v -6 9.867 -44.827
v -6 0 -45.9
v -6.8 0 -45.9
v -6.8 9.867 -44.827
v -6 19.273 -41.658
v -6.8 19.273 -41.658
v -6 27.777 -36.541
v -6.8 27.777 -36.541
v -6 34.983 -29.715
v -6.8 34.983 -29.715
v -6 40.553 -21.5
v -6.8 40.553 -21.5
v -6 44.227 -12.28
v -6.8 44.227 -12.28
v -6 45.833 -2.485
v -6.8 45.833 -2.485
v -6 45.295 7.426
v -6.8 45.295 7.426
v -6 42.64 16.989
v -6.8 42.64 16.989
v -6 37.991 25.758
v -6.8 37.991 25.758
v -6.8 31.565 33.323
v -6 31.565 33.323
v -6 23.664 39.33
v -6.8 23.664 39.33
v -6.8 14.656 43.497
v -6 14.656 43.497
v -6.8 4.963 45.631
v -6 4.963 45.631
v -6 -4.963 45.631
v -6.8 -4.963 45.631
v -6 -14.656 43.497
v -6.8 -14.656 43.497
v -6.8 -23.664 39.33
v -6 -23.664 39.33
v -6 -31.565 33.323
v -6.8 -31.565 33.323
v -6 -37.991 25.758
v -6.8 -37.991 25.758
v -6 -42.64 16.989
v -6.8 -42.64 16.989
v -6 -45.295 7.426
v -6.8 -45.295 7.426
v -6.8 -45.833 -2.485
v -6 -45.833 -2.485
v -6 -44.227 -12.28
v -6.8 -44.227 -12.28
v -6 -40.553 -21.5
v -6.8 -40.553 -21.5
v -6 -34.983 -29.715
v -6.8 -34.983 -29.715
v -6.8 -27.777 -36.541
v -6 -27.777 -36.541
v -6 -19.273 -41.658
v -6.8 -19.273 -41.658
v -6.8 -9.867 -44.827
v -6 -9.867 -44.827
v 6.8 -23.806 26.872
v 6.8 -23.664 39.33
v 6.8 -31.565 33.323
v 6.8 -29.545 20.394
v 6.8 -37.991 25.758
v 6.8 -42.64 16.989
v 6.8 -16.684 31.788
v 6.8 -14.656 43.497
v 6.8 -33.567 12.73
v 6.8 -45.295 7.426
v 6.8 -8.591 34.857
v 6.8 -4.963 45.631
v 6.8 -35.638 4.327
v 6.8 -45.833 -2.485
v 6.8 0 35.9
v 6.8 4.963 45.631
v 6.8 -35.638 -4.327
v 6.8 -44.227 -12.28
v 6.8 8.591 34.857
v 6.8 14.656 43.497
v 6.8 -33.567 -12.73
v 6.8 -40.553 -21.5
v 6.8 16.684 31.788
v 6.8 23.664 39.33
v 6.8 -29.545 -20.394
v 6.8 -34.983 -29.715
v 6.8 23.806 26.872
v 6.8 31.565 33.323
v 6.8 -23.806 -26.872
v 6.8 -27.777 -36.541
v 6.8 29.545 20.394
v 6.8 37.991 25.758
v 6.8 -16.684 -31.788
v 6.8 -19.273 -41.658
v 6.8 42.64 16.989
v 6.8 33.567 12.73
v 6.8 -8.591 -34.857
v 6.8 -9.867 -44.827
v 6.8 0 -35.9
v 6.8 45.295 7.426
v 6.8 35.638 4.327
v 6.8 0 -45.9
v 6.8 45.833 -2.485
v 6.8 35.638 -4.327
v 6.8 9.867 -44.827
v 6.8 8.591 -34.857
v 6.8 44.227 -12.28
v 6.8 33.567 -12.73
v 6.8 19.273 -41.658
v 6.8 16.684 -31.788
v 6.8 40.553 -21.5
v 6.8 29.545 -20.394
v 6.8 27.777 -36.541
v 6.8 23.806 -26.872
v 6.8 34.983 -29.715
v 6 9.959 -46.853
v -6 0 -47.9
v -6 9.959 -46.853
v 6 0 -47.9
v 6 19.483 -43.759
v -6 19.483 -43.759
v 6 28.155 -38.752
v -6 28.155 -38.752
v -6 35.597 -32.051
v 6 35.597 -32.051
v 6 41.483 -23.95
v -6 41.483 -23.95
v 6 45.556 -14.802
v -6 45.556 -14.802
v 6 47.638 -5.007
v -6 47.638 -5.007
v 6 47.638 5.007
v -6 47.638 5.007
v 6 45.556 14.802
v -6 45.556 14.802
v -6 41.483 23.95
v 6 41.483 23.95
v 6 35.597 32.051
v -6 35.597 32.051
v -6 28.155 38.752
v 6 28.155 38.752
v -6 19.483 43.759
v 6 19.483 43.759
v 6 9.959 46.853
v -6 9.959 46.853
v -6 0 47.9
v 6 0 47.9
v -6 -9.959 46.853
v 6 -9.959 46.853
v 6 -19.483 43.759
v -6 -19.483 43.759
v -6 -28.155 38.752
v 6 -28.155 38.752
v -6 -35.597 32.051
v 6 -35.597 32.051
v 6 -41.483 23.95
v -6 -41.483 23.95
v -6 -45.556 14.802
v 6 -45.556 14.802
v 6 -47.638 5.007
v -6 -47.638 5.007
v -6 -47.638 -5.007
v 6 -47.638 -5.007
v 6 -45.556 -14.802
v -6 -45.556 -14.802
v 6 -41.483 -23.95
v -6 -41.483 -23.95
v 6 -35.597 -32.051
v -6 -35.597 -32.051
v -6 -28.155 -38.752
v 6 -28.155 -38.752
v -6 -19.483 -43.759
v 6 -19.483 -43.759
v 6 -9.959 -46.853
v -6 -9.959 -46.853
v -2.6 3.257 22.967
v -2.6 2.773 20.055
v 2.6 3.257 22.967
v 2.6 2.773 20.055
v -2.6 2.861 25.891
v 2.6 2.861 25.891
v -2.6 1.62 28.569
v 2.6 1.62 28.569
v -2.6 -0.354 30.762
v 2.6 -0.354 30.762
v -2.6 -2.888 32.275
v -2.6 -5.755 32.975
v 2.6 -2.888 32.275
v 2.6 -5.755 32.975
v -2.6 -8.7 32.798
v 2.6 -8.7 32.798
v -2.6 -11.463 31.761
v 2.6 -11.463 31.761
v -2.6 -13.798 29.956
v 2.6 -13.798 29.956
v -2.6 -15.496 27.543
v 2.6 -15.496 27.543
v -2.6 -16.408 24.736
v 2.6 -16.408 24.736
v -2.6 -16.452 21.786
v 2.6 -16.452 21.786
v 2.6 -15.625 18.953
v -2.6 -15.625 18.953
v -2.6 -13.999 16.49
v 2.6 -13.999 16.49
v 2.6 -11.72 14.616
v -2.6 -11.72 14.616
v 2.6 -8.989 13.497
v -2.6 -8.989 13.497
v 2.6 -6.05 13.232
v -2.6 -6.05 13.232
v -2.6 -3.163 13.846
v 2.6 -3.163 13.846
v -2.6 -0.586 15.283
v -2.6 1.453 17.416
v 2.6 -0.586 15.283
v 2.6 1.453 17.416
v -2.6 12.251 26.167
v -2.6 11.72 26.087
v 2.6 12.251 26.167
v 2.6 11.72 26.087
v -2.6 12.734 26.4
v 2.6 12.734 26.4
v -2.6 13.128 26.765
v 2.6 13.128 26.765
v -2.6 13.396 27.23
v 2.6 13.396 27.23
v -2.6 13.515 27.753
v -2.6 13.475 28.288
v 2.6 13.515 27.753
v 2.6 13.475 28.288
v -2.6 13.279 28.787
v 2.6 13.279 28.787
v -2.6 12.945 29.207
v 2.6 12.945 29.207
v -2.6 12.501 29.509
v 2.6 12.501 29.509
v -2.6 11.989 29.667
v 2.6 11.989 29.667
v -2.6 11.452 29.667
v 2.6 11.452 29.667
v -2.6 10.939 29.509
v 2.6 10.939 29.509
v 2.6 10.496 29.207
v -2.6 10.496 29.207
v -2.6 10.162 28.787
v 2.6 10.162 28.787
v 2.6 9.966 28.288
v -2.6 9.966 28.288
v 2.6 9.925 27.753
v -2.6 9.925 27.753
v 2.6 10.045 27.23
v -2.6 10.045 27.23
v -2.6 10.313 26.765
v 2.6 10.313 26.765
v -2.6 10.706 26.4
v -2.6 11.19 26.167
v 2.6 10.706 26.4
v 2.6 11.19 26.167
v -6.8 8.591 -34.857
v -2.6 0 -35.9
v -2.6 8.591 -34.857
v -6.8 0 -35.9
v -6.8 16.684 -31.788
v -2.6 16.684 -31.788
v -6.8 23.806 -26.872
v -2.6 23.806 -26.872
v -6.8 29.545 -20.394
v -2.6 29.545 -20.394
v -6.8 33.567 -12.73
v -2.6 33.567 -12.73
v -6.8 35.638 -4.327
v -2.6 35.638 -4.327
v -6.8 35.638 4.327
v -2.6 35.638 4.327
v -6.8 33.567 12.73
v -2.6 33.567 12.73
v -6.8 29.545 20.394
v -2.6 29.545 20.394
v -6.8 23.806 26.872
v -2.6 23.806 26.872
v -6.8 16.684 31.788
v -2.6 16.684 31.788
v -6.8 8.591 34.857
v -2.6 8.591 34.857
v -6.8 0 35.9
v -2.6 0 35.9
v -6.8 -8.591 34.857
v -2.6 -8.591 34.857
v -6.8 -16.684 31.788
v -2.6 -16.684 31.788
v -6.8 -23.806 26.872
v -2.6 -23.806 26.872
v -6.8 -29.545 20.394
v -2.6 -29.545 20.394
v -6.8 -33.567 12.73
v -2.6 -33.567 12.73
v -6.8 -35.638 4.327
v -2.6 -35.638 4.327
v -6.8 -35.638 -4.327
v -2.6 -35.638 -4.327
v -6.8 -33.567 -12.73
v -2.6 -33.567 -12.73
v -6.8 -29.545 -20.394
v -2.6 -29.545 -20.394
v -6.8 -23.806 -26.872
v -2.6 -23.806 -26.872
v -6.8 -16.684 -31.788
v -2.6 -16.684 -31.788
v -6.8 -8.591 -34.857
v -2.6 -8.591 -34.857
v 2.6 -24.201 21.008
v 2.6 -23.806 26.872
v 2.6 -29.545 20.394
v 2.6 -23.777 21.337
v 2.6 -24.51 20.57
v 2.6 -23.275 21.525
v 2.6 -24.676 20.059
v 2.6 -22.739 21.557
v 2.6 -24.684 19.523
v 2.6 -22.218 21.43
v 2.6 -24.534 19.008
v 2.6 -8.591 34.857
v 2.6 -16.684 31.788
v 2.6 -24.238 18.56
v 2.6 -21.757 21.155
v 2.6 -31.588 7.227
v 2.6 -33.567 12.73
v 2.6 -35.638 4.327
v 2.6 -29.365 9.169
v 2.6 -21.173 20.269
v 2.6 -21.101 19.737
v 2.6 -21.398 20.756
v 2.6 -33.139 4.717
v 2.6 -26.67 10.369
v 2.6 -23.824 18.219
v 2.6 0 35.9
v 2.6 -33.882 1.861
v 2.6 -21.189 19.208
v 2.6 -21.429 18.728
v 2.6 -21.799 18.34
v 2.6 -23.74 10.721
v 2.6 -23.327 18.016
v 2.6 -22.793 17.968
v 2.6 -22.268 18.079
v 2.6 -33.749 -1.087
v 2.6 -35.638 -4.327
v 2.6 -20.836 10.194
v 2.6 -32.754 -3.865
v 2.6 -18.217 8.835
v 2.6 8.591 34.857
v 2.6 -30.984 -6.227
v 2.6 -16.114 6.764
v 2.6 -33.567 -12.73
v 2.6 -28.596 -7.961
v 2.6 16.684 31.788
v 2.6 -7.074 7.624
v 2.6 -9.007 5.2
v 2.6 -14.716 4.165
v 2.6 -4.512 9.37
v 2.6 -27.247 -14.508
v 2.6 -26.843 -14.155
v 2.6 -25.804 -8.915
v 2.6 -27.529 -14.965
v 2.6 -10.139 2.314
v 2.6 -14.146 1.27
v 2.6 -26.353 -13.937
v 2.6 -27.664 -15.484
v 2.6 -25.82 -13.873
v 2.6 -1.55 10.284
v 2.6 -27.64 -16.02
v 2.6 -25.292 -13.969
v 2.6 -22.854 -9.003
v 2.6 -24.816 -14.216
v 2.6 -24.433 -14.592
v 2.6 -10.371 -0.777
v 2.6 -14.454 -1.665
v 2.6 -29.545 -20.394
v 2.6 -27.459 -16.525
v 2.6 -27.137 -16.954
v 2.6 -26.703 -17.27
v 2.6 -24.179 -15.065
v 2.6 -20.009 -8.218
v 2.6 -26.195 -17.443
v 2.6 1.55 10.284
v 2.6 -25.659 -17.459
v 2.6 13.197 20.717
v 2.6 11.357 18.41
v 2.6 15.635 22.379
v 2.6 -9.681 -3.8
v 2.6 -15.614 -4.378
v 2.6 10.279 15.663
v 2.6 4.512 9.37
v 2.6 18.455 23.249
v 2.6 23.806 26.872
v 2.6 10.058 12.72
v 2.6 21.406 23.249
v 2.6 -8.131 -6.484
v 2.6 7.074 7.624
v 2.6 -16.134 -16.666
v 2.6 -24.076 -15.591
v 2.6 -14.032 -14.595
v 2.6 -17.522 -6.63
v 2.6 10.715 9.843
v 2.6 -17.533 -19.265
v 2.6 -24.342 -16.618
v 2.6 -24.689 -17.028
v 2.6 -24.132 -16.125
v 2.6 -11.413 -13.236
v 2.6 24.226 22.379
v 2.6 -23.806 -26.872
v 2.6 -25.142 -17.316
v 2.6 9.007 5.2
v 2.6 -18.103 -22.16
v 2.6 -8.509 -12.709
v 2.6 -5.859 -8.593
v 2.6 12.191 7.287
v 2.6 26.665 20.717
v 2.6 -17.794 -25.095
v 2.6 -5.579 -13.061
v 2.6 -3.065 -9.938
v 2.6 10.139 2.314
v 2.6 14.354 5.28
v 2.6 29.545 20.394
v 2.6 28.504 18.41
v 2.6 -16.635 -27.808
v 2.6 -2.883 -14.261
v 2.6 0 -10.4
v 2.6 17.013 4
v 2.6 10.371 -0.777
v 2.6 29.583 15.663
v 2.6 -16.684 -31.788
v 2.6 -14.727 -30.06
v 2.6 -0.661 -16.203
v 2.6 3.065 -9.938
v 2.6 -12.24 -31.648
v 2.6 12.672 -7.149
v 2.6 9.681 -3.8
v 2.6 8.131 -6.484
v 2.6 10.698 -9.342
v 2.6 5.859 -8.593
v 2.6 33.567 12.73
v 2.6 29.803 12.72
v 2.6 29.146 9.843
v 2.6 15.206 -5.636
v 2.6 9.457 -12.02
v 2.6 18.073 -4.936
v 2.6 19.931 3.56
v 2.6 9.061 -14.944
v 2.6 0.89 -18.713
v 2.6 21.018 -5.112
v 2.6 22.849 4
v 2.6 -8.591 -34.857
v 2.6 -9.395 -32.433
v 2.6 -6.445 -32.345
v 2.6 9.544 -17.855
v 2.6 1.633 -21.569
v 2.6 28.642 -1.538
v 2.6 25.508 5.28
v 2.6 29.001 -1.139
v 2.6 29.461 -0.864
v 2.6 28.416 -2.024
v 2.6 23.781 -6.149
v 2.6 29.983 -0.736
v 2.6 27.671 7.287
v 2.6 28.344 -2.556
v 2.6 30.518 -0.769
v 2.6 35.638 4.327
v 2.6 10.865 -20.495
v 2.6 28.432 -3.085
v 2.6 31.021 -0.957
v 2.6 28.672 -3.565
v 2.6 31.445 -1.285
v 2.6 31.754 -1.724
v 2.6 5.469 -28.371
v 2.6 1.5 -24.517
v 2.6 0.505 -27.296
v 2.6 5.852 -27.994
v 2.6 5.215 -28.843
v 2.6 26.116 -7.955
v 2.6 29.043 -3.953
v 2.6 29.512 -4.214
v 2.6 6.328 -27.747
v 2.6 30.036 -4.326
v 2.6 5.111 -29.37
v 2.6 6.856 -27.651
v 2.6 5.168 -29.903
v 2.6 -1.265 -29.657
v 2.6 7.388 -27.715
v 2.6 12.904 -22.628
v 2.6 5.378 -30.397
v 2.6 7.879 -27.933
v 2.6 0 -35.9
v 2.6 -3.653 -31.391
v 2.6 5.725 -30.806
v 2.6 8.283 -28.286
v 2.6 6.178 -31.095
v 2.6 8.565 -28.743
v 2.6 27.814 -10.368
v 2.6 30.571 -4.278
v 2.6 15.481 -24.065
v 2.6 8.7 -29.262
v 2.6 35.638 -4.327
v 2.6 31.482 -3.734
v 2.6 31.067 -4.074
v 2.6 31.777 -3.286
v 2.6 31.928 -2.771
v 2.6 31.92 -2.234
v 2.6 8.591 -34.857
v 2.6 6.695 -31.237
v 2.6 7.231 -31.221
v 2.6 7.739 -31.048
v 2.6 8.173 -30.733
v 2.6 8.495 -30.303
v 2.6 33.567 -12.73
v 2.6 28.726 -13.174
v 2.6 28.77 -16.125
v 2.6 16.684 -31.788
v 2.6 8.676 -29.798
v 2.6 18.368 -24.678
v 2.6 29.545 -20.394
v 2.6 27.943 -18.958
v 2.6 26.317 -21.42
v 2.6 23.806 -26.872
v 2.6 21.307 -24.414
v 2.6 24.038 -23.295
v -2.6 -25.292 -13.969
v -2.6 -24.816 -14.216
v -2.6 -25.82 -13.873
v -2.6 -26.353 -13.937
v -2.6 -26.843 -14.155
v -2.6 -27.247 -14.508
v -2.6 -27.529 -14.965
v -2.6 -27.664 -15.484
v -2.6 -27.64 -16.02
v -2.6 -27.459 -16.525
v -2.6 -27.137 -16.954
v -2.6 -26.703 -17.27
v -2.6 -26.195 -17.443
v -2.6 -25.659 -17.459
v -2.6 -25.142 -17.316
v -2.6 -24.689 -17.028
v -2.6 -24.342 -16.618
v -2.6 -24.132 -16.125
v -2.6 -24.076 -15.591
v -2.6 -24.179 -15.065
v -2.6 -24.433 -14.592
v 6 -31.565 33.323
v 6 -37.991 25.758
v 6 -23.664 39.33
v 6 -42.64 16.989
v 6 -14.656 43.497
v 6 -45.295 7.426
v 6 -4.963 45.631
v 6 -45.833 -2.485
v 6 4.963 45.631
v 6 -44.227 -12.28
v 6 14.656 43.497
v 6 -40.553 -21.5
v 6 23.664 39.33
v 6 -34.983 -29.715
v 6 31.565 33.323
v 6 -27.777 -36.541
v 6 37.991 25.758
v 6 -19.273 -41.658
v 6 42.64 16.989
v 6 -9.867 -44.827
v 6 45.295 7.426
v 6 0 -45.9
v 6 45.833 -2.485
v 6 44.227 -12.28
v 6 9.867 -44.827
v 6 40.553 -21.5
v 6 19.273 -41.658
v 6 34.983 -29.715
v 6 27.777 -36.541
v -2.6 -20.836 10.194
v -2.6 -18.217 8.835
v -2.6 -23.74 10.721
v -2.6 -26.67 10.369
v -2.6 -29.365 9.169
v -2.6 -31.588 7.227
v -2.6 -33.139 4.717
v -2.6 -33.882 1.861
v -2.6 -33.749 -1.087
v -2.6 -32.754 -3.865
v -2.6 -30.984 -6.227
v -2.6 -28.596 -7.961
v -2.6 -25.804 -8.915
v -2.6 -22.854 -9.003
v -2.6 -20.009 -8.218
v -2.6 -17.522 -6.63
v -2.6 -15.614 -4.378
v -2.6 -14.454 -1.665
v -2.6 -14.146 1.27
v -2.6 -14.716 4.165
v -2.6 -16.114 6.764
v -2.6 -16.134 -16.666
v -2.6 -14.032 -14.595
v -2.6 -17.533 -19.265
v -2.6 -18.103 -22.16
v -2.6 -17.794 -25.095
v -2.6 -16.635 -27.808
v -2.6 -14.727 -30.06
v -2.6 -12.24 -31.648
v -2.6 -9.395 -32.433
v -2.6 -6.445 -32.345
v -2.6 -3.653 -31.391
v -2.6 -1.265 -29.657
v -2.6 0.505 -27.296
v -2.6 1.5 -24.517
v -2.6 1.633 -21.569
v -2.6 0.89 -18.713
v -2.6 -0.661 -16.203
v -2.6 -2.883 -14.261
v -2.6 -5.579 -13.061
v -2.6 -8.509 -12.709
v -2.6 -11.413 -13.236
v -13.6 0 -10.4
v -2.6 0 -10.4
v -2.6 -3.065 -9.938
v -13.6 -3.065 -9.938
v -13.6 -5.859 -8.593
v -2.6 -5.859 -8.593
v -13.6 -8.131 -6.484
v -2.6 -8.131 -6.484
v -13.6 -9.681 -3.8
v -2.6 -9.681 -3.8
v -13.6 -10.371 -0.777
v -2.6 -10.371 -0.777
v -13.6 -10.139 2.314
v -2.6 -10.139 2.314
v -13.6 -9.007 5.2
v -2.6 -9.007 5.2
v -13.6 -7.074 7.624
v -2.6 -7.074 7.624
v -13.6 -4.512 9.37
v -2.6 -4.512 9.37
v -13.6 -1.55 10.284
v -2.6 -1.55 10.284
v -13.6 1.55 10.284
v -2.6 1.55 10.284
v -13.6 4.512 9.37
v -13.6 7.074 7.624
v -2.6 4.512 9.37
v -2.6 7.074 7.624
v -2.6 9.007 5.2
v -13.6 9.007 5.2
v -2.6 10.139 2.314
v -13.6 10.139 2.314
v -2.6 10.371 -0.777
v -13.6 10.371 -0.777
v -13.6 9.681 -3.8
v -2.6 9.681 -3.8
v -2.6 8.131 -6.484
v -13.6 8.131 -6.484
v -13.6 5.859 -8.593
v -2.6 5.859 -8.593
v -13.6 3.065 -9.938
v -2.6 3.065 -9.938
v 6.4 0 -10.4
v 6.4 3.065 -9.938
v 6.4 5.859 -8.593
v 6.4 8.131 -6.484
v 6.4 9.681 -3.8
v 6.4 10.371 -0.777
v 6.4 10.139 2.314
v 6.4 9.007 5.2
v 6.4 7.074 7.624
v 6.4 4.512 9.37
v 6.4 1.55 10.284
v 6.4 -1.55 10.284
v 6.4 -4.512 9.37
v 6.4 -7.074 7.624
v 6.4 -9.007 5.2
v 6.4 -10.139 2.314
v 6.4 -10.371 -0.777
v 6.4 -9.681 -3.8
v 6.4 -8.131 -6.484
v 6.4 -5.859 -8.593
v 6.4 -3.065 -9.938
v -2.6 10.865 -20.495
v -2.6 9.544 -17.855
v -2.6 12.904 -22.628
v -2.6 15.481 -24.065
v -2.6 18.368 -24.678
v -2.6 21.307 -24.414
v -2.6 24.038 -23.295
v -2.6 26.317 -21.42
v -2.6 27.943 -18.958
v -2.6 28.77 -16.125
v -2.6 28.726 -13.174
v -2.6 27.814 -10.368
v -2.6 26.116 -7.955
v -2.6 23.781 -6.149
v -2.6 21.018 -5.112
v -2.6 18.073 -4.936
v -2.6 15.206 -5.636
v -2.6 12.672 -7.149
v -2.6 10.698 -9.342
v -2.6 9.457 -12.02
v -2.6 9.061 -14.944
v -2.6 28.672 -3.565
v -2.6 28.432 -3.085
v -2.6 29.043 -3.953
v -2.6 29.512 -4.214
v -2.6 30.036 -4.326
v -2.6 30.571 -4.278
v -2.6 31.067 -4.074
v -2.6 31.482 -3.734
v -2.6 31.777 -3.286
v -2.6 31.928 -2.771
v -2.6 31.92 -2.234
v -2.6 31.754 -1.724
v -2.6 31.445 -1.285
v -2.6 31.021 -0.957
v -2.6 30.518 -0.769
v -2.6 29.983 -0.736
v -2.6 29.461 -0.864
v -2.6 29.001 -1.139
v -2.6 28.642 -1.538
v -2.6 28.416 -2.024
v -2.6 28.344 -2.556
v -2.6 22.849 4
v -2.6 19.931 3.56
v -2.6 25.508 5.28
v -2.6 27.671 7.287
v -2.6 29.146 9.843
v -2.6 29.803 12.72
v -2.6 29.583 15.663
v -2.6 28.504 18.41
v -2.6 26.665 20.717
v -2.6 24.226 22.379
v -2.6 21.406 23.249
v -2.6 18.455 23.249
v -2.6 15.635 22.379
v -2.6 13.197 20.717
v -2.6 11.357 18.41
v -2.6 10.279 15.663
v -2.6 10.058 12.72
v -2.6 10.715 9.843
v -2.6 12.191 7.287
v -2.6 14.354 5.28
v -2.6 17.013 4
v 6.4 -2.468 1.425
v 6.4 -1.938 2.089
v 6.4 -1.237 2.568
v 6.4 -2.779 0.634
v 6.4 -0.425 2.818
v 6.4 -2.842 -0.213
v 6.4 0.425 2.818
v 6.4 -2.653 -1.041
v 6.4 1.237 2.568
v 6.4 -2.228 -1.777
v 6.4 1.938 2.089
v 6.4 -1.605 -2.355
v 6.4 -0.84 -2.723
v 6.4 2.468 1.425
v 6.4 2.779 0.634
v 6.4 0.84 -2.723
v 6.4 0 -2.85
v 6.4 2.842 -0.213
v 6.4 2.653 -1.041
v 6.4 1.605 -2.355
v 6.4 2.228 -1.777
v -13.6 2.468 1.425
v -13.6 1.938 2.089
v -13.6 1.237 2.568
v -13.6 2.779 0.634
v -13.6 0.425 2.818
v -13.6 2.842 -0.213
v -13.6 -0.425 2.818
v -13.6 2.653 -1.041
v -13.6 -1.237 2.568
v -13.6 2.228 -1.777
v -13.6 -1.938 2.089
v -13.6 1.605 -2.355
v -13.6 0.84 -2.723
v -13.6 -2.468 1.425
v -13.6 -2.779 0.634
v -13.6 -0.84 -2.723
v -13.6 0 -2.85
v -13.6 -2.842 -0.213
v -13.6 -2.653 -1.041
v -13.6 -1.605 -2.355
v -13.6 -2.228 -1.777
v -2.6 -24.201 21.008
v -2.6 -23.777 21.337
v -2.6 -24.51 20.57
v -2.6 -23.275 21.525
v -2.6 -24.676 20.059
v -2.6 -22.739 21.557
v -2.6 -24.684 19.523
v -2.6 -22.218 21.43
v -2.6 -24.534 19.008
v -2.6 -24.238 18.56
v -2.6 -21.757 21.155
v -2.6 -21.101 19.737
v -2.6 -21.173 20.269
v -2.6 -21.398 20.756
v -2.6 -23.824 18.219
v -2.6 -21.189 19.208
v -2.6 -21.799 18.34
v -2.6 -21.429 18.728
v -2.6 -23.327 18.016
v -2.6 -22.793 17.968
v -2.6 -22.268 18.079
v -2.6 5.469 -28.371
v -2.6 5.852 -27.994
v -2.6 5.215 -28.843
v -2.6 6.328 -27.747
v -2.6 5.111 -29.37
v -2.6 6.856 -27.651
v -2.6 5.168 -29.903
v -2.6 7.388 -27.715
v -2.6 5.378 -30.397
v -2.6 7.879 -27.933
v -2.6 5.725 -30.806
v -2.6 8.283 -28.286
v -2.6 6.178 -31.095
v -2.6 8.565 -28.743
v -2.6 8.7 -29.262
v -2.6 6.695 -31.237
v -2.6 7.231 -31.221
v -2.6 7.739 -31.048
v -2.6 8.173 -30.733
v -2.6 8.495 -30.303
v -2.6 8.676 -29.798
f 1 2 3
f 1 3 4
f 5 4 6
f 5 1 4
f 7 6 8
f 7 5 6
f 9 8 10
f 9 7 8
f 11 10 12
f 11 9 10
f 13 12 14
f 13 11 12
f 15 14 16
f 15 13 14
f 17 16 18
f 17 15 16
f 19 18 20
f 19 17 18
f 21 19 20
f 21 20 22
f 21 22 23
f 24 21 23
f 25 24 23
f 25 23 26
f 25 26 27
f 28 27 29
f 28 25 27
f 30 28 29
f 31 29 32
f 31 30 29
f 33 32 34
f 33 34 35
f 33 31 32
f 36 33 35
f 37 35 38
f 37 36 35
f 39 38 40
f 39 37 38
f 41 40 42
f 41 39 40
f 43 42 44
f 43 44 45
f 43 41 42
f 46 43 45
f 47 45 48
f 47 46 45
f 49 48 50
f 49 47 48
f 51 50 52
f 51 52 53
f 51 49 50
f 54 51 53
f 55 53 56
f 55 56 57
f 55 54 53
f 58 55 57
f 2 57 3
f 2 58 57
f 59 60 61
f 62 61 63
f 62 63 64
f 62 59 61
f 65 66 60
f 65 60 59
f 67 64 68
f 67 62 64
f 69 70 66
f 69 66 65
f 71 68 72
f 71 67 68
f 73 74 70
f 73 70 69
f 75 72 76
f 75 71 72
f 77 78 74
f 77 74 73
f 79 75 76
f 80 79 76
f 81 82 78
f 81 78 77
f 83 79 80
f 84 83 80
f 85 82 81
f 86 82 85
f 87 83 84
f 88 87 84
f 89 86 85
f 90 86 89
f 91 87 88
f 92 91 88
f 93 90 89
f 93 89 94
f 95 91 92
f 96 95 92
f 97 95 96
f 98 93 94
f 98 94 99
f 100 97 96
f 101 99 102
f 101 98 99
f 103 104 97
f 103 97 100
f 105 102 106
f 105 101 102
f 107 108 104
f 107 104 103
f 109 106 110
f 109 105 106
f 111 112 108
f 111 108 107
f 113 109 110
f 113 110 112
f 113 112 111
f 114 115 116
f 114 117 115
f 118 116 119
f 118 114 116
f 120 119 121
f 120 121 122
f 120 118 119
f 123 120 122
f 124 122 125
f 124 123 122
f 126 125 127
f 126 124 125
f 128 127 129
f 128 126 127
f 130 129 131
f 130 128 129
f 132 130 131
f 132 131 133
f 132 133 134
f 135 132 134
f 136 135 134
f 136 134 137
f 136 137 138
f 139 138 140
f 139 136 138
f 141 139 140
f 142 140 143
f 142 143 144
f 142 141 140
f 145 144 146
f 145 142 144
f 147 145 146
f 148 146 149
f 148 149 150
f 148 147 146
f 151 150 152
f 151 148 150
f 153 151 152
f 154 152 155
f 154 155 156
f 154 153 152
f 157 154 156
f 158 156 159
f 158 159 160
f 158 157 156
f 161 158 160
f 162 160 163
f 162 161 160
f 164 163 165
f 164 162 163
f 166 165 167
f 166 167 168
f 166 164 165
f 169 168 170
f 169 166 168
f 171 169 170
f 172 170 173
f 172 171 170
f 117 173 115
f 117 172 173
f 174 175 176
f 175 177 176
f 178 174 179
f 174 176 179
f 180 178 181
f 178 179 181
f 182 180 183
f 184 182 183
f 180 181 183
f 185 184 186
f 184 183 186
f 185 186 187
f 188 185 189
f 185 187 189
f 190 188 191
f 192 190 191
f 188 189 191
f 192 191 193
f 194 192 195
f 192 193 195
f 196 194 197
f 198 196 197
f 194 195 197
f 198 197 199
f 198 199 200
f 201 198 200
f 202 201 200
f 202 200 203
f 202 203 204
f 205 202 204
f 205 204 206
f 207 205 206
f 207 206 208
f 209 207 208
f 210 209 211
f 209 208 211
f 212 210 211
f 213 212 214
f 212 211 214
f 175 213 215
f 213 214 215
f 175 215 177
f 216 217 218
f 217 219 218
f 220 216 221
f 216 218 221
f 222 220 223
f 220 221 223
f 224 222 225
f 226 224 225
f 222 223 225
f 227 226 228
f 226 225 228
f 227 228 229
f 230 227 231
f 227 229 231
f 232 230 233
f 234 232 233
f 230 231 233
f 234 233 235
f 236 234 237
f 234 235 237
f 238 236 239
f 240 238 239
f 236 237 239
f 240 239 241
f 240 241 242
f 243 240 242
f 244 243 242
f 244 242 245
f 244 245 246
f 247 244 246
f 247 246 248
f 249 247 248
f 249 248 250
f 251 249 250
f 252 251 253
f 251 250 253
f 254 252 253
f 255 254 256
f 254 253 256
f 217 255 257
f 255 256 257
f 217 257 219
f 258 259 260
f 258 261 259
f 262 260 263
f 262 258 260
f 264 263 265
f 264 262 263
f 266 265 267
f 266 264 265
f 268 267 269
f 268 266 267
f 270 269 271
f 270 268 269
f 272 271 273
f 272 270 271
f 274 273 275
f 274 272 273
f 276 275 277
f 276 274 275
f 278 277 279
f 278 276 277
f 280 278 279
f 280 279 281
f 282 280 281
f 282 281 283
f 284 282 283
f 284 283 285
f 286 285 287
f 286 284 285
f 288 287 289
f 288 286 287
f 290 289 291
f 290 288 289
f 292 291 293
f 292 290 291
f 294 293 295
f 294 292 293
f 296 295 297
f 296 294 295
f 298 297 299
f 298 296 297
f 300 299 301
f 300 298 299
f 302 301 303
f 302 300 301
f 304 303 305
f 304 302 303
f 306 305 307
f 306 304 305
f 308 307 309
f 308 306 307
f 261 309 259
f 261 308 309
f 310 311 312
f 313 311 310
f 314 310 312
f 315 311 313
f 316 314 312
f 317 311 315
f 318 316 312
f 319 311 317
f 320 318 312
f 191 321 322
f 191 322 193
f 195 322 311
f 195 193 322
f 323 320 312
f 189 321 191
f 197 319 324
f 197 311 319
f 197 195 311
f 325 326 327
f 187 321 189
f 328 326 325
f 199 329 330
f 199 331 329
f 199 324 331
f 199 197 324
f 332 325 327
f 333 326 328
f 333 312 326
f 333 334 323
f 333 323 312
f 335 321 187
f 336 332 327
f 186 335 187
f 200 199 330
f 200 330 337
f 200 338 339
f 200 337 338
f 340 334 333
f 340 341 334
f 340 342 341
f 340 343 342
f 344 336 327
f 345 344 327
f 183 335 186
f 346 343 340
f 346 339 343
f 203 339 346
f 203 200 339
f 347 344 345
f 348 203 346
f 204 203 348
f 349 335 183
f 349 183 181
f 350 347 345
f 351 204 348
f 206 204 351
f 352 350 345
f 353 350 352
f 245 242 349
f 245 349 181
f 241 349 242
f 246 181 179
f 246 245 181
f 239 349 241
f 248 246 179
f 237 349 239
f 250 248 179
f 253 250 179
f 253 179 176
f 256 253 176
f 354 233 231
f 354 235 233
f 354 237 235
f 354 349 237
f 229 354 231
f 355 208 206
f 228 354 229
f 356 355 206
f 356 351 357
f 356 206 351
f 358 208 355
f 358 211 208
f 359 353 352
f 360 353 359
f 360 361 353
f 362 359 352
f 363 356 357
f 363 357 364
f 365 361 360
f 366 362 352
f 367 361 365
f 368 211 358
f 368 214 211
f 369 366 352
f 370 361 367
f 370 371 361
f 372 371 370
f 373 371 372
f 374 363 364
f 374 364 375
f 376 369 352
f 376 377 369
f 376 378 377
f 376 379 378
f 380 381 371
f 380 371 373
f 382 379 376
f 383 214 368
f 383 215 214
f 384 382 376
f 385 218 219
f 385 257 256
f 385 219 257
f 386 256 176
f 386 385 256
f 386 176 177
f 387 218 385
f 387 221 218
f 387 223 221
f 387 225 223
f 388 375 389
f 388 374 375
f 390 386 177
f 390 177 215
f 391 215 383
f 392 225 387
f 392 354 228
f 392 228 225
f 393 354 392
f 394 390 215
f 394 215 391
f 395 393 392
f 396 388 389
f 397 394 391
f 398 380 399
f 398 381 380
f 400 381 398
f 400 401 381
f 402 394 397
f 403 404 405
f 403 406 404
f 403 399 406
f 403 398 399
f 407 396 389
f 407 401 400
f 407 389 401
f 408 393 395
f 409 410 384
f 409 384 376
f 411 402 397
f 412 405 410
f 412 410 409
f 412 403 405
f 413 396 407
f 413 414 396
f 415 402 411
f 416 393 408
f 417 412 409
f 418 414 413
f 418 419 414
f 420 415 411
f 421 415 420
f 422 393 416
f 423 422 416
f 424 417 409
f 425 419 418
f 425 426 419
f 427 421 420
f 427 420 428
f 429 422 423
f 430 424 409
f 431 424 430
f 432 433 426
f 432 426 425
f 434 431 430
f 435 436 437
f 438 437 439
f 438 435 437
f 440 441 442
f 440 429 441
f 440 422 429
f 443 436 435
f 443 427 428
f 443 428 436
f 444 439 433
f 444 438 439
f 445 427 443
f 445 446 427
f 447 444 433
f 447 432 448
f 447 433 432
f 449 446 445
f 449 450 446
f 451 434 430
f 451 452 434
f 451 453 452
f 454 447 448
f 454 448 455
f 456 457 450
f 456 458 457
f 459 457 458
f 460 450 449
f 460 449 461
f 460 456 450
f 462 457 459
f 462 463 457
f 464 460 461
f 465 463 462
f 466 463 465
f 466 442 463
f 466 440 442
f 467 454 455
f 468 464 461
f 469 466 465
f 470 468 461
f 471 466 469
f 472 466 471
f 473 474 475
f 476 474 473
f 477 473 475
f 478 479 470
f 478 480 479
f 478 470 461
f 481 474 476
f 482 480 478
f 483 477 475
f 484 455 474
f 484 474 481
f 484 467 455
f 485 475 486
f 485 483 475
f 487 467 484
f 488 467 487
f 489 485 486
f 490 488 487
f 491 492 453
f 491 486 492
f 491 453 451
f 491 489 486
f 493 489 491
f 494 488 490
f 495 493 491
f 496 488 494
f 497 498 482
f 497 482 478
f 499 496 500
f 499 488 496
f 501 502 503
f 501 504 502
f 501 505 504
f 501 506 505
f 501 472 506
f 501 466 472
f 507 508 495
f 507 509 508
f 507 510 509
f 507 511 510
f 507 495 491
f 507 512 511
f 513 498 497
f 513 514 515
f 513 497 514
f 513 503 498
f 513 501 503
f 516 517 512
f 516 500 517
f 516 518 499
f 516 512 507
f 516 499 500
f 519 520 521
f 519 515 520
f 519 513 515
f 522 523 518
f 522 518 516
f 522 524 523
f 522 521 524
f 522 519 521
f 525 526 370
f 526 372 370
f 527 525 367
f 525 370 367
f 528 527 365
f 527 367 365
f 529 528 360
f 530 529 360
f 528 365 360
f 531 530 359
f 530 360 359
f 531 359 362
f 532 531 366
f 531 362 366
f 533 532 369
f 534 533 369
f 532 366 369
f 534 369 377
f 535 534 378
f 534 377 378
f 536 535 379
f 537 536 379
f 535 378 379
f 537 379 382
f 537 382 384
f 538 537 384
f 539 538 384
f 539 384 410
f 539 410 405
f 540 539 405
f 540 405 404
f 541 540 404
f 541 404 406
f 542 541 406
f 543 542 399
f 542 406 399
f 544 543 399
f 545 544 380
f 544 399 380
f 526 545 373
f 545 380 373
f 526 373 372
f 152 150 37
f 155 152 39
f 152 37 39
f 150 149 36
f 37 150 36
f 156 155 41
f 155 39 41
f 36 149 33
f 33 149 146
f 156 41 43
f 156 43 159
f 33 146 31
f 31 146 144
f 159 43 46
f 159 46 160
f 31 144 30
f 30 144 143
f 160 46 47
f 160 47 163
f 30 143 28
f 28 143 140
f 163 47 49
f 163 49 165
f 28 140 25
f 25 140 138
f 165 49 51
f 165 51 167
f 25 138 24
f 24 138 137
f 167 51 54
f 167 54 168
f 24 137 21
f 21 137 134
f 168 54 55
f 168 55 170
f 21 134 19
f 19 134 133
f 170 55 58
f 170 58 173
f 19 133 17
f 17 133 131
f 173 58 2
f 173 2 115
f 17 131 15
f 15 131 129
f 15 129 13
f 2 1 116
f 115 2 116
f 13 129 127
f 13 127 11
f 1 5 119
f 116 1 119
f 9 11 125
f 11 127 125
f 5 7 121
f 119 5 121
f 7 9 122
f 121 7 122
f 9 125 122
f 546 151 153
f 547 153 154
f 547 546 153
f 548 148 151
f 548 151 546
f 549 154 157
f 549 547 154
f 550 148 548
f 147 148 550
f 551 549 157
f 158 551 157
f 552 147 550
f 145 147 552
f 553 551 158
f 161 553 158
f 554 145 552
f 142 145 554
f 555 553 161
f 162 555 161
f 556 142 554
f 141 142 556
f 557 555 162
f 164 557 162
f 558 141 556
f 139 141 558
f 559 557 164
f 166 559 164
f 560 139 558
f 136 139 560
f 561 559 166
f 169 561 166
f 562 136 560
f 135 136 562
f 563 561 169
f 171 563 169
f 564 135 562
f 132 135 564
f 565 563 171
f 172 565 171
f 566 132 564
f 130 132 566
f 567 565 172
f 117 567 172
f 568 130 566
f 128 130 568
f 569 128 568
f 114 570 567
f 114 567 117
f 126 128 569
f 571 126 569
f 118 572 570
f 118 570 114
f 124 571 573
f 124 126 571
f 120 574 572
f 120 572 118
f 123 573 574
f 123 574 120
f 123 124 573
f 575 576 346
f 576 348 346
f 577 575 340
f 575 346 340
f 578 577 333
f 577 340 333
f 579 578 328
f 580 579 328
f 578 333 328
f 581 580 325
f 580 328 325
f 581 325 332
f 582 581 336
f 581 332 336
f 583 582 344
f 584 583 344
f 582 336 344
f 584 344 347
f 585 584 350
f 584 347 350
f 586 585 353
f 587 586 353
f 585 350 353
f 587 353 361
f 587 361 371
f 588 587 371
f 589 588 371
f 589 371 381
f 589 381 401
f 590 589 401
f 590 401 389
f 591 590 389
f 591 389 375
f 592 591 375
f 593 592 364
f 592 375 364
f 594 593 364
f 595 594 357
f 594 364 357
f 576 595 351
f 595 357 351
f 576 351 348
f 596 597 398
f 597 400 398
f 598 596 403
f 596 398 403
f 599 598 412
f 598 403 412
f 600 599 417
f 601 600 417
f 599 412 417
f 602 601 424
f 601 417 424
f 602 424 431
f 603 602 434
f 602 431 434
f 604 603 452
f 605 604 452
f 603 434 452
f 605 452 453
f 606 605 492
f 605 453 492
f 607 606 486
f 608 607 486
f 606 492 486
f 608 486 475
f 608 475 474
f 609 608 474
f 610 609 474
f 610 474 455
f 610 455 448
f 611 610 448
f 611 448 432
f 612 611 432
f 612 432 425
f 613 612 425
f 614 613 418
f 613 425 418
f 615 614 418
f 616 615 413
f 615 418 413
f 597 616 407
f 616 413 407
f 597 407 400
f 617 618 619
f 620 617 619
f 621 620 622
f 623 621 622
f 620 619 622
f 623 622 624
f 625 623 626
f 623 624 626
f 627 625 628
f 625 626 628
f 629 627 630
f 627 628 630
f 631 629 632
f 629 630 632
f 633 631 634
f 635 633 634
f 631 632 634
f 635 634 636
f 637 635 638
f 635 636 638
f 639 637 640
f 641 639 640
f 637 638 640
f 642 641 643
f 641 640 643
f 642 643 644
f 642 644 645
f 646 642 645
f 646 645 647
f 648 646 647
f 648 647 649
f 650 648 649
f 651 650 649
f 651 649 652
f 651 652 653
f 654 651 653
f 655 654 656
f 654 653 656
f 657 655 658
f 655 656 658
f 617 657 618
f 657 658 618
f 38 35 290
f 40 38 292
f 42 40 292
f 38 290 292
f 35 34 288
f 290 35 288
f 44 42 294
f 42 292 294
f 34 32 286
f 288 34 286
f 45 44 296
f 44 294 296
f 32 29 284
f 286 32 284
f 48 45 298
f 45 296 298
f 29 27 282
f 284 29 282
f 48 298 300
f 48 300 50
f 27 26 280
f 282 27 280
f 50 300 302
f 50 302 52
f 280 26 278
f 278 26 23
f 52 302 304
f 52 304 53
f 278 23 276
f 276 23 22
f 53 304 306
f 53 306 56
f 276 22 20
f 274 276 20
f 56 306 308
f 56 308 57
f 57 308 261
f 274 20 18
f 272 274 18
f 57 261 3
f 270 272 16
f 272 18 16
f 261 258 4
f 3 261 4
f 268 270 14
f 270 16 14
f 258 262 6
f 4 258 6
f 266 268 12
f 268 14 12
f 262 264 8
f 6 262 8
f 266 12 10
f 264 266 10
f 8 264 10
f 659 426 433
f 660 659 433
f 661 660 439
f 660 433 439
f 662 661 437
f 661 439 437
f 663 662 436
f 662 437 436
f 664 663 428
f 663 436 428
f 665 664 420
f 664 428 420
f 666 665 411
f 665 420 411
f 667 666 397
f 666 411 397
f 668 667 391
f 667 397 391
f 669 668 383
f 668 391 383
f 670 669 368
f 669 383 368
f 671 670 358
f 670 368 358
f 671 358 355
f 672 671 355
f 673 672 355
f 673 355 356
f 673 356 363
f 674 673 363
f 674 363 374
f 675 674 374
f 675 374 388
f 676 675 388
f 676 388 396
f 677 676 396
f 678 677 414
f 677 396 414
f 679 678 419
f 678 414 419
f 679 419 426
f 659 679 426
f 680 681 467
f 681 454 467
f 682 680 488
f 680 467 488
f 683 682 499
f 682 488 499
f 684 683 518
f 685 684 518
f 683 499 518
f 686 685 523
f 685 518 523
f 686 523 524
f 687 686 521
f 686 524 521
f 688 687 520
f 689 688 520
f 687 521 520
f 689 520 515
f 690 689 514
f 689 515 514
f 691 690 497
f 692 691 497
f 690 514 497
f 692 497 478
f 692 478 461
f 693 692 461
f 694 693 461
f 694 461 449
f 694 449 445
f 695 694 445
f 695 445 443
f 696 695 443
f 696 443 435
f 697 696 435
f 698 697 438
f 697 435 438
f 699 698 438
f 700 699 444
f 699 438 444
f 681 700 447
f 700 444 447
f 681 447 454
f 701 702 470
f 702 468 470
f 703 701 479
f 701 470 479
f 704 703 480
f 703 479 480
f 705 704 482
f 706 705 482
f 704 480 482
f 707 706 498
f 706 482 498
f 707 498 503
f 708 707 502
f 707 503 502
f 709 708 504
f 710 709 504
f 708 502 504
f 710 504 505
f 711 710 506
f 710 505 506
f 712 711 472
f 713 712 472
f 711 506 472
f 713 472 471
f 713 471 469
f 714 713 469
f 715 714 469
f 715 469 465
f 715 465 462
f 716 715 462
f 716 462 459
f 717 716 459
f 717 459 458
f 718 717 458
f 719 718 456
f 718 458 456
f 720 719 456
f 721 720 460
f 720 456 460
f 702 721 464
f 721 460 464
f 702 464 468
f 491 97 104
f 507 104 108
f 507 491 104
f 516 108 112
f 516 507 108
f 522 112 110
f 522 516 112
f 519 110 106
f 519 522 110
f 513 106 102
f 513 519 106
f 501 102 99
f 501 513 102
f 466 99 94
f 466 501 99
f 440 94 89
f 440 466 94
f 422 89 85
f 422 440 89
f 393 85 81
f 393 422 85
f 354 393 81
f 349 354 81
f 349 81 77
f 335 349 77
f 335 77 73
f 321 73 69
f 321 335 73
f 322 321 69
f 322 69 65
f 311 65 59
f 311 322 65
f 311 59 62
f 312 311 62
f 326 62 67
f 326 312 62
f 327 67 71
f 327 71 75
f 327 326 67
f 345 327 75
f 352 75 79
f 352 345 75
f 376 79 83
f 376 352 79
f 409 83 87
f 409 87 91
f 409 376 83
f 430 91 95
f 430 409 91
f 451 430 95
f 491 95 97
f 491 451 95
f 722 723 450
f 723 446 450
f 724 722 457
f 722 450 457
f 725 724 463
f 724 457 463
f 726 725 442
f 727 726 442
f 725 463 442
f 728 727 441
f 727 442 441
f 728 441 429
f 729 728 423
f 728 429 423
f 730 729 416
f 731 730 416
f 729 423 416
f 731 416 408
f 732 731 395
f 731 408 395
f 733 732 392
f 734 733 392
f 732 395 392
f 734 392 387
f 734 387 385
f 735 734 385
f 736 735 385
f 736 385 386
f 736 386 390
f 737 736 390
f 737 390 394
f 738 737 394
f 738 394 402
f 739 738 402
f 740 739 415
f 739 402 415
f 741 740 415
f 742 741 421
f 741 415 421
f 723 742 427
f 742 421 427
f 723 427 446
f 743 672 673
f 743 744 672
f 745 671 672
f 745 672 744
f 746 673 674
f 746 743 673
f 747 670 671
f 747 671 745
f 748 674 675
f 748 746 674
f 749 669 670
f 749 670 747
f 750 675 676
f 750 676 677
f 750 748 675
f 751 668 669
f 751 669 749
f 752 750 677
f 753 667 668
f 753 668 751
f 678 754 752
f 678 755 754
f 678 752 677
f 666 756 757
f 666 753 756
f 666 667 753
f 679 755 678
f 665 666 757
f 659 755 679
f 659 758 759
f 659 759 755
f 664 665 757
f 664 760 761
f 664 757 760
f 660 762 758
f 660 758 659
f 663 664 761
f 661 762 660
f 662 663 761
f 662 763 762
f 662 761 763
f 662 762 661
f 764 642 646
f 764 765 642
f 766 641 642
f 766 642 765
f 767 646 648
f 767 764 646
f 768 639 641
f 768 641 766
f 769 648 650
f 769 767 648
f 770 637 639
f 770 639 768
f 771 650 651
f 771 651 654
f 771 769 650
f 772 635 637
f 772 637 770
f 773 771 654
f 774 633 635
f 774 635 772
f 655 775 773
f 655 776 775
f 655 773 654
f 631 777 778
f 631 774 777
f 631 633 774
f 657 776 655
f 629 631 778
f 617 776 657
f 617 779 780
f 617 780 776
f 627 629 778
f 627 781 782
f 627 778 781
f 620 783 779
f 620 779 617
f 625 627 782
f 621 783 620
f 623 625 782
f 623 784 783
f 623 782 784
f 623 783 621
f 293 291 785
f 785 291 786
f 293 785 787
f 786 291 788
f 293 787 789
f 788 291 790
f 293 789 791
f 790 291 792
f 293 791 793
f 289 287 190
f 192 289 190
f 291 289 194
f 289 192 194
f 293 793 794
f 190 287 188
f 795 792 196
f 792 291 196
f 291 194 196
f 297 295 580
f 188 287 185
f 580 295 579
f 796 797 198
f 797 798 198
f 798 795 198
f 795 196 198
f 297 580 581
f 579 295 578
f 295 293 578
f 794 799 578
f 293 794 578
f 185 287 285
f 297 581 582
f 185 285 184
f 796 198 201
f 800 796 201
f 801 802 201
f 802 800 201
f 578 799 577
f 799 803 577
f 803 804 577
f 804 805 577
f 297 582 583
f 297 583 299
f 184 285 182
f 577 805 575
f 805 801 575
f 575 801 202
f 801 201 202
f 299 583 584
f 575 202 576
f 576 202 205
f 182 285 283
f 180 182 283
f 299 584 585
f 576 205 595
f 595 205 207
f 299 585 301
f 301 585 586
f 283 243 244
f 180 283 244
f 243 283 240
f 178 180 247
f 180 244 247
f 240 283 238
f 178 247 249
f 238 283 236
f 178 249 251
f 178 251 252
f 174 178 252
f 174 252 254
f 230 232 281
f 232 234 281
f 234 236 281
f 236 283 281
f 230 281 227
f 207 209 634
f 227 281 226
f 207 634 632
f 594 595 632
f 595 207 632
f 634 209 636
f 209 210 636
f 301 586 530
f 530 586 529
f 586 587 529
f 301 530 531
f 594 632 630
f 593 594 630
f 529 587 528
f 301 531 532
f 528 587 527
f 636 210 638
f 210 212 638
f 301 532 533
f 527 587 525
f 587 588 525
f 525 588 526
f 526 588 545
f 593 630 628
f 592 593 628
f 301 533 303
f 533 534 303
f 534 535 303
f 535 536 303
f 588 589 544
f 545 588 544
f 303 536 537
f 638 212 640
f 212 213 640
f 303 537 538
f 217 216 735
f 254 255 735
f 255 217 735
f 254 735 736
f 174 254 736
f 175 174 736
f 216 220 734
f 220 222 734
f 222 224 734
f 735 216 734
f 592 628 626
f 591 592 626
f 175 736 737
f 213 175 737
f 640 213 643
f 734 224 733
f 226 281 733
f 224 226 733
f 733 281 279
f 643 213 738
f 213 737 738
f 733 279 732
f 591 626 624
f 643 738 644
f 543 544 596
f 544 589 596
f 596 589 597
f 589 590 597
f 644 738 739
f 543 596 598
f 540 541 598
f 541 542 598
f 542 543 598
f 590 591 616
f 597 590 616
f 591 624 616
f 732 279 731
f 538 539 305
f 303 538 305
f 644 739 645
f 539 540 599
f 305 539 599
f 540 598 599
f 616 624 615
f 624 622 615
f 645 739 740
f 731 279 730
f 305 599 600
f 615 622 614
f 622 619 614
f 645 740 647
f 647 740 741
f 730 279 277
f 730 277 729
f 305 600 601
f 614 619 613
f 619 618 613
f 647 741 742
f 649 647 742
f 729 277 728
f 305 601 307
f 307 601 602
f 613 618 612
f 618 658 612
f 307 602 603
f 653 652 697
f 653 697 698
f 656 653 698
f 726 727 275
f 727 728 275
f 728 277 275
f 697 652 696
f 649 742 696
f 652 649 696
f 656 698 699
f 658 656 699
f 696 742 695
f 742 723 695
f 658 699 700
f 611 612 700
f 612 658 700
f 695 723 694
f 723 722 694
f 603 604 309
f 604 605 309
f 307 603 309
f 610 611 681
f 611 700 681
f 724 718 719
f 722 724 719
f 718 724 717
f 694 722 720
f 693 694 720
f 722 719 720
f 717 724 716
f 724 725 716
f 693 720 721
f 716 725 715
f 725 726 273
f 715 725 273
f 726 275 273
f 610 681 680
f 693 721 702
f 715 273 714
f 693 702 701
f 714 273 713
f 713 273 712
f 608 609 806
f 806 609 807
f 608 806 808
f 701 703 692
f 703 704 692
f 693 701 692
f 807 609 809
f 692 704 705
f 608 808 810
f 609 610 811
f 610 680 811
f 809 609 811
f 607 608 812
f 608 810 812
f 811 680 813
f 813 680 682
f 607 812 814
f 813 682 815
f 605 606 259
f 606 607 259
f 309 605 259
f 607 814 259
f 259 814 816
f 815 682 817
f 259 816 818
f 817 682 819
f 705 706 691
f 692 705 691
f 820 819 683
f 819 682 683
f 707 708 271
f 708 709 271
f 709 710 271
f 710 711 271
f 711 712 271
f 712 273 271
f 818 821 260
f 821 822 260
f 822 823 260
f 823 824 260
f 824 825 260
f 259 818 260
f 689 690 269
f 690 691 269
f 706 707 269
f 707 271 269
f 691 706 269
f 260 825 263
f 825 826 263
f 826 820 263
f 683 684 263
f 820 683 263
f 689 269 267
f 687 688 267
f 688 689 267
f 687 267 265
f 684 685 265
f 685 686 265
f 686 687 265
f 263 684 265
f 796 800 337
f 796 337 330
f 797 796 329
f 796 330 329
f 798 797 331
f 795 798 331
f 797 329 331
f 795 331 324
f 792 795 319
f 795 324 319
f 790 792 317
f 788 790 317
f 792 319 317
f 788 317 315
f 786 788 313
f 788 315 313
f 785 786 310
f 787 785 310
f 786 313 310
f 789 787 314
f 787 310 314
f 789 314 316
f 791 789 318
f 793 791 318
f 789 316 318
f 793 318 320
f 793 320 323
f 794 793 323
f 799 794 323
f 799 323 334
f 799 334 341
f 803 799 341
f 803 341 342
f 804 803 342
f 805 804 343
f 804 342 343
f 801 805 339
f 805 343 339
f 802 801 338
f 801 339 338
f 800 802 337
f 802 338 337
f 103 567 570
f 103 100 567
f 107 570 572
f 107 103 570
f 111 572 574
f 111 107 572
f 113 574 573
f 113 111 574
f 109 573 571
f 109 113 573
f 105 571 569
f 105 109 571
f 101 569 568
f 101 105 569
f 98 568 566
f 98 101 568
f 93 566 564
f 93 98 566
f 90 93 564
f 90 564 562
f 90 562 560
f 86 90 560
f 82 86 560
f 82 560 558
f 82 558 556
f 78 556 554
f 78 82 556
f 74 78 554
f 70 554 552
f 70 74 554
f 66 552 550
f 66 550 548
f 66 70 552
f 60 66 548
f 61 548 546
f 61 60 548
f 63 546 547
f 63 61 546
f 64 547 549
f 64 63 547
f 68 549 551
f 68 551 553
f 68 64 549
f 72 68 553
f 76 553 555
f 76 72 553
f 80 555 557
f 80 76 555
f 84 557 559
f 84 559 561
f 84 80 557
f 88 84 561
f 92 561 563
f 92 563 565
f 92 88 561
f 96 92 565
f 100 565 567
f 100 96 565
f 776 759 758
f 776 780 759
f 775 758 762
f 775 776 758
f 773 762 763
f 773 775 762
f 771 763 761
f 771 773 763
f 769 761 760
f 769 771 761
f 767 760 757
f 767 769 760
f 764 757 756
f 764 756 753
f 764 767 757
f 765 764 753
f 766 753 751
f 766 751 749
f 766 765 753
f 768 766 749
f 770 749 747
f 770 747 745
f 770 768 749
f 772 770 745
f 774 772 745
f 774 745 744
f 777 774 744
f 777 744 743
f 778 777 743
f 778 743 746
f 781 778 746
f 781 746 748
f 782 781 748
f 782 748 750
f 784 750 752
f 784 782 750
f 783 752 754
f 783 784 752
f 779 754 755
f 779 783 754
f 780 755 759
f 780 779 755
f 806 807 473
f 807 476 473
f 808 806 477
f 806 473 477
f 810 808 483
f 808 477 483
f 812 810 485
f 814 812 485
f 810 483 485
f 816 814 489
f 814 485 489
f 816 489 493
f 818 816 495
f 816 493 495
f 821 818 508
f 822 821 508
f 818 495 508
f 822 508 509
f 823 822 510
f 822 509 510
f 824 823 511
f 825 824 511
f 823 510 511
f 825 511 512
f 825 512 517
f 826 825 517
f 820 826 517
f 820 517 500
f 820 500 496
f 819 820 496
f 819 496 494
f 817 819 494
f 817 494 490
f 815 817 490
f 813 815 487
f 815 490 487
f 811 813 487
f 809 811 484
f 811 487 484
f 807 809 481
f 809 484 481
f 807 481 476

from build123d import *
from build123d.topology import SkipClean

# Parameters (mm, degrees)
SKETCH_3_R               = 45.9
EXTRUDE_3_DEPTH          = 2.6
SKETCH_4_R               = 45.9
SKETCH_4_R_2             = 35.9
EXTRUDE_4_DEPTH          = 6.8
SKETCH_5_R               = 2.85
CUT_EXTRUDE_3_DEPTH      = 6.8
SKETCH_13_R              = 10.4
SKETCH_13_R_2            = 2.85
EXTRUDE_5_DEPTH          = 11
EXTRUDE_START            = 3.8
SKETCH_14_R              = 10.4
SKETCH_14_R_2            = 2.85
EXTRUDE_6_DEPTH          = 3.8
SKETCH_17_R              = 9.9
CUT_EXTRUDE_5_DEPTH      = 67.321791291
PATTERN_CIRCULAR_1_COUNT = 5
SKETCH_19_R              = 1.8
CUT_EXTRUDE_6_DEPTH      = 67.321791291
PATTERN_CIRCULAR_2_COUNT = 5
SKETCH_20_R              = 47.9
SKETCH_20_R_2            = 45.9
EXTRUDE_7_DEPTH          = 6


with BuildPart() as part:
    # 草图3 → 凸台-拉伸3 (new, symmetric)
    with BuildSketch(Plane(origin=(0, 0, 0), x_dir=(0, 0, -1), z_dir=(1, 0, 0))):
        Circle(SKETCH_3_R)
    extrude(amount=EXTRUDE_3_DEPTH, both=True)

    # 草图4 → 凸台-拉伸4 (add, symmetric)
    with BuildSketch(Plane(origin=(0, 0, 0), x_dir=(0, 0, -1), z_dir=(1, 0, 0))):
        Circle(SKETCH_4_R)
        Circle(SKETCH_4_R_2, mode=Mode.SUBTRACT)
    extrude(amount=EXTRUDE_4_DEPTH, both=True)

    # 草图5 → 切除-拉伸3 (cut, symmetric)
    with BuildSketch(Plane(origin=(0, 0, 0), x_dir=(0, 0, -1), z_dir=(1, 0, 0))):
        Circle(SKETCH_5_R)
    extrude(amount=CUT_EXTRUDE_3_DEPTH, both=True, mode=Mode.SUBTRACT)

    # 草图13 → 凸台-拉伸5 (add)
    with SkipClean():  # the faces are left unmerged after this step: merging them gives an invalid solid
        with BuildSketch(Plane.ZY.offset(2.6)):
            Circle(SKETCH_13_R)
            Circle(SKETCH_13_R_2, mode=Mode.SUBTRACT)
        extrude(amount=EXTRUDE_5_DEPTH)

    # 草图14 → 凸台-拉伸6 (add)
    with SkipClean():  # the faces are left unmerged after this step: merging them gives an invalid solid
        with BuildSketch(Plane(origin=(2.6, 0, 0), x_dir=(0, 0, -1), z_dir=(1, 0, 0)).offset(EXTRUDE_START)):
            Circle(SKETCH_14_R)
            Circle(SKETCH_14_R_2, mode=Mode.SUBTRACT)
        extrude(amount=-EXTRUDE_6_DEPTH)

    # 草图17 → 切除-拉伸5 (cut, symmetric)
    with SkipClean():  # the faces are left unmerged after this step: merging them gives an invalid solid
        with BuildSketch(Plane(origin=(0, 0, 0), x_dir=(0, 0, -1), z_dir=(1, 0, 0))):
            with Locations((-13.45976737, 19.930809375)):
                Circle(SKETCH_17_R)
        cut_extrude_5 = extrude(amount=CUT_EXTRUDE_5_DEPTH, both=True, mode=Mode.SUBTRACT)

    # 阵列(圆周)1: 切除-拉伸5 ×5 about axis
    with SkipClean():  # the faces are left unmerged after this step: merging them gives an invalid solid
        pattern_circular_1_axis = Axis((7.82, 0, 0), (-1, 0, 0))
        for i in range(1, PATTERN_CIRCULAR_1_COUNT):
            add(cut_extrude_5.rotate(pattern_circular_1_axis, i * 360 / PATTERN_CIRCULAR_1_COUNT), mode=Mode.SUBTRACT)

    # 草图19 → 切除-拉伸6 (cut, symmetric)
    with SkipClean():  # the faces are left unmerged after this step: merging them gives an invalid solid
        with BuildSketch(Plane(origin=(0, 0, 0), x_dir=(0, 0, -1), z_dir=(1, 0, 0))):
            with Locations((-27.887163563, 11.720435504)):
                Circle(SKETCH_19_R)
        cut_extrude_6 = extrude(amount=CUT_EXTRUDE_6_DEPTH, both=True, mode=Mode.SUBTRACT)

    # 阵列(圆周)2: 切除-拉伸6 ×5 about axis
    with SkipClean():  # the faces are left unmerged after this step: merging them gives an invalid solid
        pattern_circular_2_axis = Axis((7.82, 0, 0), (-1, 0, 0))
        for i in range(1, PATTERN_CIRCULAR_2_COUNT):
            add(cut_extrude_6.rotate(pattern_circular_2_axis, i * 360 / PATTERN_CIRCULAR_2_COUNT), mode=Mode.SUBTRACT)

    # 草图20 → 凸台-拉伸7 (add, symmetric)
    with SkipClean():  # the faces are left unmerged after this step: merging them gives an invalid solid
        with BuildSketch(Plane(origin=(0, 0, 0), x_dir=(0, 0, -1), z_dir=(1, 0, 0))):
            Circle(SKETCH_20_R)
            Circle(SKETCH_20_R_2, mode=Mode.SUBTRACT)
        extrude(amount=EXTRUDE_7_DEPTH, both=True)


solid = part.part
